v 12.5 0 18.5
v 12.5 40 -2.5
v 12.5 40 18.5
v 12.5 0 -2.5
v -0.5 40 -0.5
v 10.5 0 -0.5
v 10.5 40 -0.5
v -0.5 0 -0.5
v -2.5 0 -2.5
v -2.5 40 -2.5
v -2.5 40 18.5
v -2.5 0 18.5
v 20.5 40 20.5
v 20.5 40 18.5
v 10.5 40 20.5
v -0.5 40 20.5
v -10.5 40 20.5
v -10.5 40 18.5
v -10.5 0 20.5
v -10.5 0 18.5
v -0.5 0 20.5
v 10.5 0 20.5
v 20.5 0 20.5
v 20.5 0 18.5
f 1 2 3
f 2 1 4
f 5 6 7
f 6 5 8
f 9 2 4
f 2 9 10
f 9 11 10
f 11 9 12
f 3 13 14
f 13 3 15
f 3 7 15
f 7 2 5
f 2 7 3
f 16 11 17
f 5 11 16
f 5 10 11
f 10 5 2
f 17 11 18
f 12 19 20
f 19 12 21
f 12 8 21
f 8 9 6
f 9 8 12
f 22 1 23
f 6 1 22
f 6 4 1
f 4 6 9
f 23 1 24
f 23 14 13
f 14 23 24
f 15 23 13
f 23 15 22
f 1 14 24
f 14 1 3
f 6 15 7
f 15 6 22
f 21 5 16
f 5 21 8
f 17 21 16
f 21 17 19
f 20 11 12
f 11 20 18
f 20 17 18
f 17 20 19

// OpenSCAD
//Breite Box
bb=200;
//Tiefe Box
tb=20;
//Hoehe box
hb=20;
//Thickness
t=2;

tr=t/2/2;

//difference()
//{
//cube([bb, tb, hb]);
//
//translate([t,t,t])
//cube([bb-t*2, tb-t*2, hb]);
//}
//Breite Holder
bh=hb/2;
//Tiefe Holder
th=tb*2;
//Hoehe Holder
hh=hb;

//translate([0,tb,0])
//color("blue")
// cube([bh,th,hh]);
//
//translate([bb-bh,tb,0])
//cube([bh,th,hh]);

translate([-t-tr,0,-t-tr])
cube([t+bh+t+tr+tr,th,t]);

translate([bh+tr,0,hh-t+tr])
cube([bh,th,t]);

translate([bh+tr,0,-tr])
cube([t,th,hh+tr*2]);

translate([-t-tr,0,-tr])
cube([t,th,hh+tr*2]);

translate([-bh-tr,0,hh-t+tr])
cube([bh,th,t]);
